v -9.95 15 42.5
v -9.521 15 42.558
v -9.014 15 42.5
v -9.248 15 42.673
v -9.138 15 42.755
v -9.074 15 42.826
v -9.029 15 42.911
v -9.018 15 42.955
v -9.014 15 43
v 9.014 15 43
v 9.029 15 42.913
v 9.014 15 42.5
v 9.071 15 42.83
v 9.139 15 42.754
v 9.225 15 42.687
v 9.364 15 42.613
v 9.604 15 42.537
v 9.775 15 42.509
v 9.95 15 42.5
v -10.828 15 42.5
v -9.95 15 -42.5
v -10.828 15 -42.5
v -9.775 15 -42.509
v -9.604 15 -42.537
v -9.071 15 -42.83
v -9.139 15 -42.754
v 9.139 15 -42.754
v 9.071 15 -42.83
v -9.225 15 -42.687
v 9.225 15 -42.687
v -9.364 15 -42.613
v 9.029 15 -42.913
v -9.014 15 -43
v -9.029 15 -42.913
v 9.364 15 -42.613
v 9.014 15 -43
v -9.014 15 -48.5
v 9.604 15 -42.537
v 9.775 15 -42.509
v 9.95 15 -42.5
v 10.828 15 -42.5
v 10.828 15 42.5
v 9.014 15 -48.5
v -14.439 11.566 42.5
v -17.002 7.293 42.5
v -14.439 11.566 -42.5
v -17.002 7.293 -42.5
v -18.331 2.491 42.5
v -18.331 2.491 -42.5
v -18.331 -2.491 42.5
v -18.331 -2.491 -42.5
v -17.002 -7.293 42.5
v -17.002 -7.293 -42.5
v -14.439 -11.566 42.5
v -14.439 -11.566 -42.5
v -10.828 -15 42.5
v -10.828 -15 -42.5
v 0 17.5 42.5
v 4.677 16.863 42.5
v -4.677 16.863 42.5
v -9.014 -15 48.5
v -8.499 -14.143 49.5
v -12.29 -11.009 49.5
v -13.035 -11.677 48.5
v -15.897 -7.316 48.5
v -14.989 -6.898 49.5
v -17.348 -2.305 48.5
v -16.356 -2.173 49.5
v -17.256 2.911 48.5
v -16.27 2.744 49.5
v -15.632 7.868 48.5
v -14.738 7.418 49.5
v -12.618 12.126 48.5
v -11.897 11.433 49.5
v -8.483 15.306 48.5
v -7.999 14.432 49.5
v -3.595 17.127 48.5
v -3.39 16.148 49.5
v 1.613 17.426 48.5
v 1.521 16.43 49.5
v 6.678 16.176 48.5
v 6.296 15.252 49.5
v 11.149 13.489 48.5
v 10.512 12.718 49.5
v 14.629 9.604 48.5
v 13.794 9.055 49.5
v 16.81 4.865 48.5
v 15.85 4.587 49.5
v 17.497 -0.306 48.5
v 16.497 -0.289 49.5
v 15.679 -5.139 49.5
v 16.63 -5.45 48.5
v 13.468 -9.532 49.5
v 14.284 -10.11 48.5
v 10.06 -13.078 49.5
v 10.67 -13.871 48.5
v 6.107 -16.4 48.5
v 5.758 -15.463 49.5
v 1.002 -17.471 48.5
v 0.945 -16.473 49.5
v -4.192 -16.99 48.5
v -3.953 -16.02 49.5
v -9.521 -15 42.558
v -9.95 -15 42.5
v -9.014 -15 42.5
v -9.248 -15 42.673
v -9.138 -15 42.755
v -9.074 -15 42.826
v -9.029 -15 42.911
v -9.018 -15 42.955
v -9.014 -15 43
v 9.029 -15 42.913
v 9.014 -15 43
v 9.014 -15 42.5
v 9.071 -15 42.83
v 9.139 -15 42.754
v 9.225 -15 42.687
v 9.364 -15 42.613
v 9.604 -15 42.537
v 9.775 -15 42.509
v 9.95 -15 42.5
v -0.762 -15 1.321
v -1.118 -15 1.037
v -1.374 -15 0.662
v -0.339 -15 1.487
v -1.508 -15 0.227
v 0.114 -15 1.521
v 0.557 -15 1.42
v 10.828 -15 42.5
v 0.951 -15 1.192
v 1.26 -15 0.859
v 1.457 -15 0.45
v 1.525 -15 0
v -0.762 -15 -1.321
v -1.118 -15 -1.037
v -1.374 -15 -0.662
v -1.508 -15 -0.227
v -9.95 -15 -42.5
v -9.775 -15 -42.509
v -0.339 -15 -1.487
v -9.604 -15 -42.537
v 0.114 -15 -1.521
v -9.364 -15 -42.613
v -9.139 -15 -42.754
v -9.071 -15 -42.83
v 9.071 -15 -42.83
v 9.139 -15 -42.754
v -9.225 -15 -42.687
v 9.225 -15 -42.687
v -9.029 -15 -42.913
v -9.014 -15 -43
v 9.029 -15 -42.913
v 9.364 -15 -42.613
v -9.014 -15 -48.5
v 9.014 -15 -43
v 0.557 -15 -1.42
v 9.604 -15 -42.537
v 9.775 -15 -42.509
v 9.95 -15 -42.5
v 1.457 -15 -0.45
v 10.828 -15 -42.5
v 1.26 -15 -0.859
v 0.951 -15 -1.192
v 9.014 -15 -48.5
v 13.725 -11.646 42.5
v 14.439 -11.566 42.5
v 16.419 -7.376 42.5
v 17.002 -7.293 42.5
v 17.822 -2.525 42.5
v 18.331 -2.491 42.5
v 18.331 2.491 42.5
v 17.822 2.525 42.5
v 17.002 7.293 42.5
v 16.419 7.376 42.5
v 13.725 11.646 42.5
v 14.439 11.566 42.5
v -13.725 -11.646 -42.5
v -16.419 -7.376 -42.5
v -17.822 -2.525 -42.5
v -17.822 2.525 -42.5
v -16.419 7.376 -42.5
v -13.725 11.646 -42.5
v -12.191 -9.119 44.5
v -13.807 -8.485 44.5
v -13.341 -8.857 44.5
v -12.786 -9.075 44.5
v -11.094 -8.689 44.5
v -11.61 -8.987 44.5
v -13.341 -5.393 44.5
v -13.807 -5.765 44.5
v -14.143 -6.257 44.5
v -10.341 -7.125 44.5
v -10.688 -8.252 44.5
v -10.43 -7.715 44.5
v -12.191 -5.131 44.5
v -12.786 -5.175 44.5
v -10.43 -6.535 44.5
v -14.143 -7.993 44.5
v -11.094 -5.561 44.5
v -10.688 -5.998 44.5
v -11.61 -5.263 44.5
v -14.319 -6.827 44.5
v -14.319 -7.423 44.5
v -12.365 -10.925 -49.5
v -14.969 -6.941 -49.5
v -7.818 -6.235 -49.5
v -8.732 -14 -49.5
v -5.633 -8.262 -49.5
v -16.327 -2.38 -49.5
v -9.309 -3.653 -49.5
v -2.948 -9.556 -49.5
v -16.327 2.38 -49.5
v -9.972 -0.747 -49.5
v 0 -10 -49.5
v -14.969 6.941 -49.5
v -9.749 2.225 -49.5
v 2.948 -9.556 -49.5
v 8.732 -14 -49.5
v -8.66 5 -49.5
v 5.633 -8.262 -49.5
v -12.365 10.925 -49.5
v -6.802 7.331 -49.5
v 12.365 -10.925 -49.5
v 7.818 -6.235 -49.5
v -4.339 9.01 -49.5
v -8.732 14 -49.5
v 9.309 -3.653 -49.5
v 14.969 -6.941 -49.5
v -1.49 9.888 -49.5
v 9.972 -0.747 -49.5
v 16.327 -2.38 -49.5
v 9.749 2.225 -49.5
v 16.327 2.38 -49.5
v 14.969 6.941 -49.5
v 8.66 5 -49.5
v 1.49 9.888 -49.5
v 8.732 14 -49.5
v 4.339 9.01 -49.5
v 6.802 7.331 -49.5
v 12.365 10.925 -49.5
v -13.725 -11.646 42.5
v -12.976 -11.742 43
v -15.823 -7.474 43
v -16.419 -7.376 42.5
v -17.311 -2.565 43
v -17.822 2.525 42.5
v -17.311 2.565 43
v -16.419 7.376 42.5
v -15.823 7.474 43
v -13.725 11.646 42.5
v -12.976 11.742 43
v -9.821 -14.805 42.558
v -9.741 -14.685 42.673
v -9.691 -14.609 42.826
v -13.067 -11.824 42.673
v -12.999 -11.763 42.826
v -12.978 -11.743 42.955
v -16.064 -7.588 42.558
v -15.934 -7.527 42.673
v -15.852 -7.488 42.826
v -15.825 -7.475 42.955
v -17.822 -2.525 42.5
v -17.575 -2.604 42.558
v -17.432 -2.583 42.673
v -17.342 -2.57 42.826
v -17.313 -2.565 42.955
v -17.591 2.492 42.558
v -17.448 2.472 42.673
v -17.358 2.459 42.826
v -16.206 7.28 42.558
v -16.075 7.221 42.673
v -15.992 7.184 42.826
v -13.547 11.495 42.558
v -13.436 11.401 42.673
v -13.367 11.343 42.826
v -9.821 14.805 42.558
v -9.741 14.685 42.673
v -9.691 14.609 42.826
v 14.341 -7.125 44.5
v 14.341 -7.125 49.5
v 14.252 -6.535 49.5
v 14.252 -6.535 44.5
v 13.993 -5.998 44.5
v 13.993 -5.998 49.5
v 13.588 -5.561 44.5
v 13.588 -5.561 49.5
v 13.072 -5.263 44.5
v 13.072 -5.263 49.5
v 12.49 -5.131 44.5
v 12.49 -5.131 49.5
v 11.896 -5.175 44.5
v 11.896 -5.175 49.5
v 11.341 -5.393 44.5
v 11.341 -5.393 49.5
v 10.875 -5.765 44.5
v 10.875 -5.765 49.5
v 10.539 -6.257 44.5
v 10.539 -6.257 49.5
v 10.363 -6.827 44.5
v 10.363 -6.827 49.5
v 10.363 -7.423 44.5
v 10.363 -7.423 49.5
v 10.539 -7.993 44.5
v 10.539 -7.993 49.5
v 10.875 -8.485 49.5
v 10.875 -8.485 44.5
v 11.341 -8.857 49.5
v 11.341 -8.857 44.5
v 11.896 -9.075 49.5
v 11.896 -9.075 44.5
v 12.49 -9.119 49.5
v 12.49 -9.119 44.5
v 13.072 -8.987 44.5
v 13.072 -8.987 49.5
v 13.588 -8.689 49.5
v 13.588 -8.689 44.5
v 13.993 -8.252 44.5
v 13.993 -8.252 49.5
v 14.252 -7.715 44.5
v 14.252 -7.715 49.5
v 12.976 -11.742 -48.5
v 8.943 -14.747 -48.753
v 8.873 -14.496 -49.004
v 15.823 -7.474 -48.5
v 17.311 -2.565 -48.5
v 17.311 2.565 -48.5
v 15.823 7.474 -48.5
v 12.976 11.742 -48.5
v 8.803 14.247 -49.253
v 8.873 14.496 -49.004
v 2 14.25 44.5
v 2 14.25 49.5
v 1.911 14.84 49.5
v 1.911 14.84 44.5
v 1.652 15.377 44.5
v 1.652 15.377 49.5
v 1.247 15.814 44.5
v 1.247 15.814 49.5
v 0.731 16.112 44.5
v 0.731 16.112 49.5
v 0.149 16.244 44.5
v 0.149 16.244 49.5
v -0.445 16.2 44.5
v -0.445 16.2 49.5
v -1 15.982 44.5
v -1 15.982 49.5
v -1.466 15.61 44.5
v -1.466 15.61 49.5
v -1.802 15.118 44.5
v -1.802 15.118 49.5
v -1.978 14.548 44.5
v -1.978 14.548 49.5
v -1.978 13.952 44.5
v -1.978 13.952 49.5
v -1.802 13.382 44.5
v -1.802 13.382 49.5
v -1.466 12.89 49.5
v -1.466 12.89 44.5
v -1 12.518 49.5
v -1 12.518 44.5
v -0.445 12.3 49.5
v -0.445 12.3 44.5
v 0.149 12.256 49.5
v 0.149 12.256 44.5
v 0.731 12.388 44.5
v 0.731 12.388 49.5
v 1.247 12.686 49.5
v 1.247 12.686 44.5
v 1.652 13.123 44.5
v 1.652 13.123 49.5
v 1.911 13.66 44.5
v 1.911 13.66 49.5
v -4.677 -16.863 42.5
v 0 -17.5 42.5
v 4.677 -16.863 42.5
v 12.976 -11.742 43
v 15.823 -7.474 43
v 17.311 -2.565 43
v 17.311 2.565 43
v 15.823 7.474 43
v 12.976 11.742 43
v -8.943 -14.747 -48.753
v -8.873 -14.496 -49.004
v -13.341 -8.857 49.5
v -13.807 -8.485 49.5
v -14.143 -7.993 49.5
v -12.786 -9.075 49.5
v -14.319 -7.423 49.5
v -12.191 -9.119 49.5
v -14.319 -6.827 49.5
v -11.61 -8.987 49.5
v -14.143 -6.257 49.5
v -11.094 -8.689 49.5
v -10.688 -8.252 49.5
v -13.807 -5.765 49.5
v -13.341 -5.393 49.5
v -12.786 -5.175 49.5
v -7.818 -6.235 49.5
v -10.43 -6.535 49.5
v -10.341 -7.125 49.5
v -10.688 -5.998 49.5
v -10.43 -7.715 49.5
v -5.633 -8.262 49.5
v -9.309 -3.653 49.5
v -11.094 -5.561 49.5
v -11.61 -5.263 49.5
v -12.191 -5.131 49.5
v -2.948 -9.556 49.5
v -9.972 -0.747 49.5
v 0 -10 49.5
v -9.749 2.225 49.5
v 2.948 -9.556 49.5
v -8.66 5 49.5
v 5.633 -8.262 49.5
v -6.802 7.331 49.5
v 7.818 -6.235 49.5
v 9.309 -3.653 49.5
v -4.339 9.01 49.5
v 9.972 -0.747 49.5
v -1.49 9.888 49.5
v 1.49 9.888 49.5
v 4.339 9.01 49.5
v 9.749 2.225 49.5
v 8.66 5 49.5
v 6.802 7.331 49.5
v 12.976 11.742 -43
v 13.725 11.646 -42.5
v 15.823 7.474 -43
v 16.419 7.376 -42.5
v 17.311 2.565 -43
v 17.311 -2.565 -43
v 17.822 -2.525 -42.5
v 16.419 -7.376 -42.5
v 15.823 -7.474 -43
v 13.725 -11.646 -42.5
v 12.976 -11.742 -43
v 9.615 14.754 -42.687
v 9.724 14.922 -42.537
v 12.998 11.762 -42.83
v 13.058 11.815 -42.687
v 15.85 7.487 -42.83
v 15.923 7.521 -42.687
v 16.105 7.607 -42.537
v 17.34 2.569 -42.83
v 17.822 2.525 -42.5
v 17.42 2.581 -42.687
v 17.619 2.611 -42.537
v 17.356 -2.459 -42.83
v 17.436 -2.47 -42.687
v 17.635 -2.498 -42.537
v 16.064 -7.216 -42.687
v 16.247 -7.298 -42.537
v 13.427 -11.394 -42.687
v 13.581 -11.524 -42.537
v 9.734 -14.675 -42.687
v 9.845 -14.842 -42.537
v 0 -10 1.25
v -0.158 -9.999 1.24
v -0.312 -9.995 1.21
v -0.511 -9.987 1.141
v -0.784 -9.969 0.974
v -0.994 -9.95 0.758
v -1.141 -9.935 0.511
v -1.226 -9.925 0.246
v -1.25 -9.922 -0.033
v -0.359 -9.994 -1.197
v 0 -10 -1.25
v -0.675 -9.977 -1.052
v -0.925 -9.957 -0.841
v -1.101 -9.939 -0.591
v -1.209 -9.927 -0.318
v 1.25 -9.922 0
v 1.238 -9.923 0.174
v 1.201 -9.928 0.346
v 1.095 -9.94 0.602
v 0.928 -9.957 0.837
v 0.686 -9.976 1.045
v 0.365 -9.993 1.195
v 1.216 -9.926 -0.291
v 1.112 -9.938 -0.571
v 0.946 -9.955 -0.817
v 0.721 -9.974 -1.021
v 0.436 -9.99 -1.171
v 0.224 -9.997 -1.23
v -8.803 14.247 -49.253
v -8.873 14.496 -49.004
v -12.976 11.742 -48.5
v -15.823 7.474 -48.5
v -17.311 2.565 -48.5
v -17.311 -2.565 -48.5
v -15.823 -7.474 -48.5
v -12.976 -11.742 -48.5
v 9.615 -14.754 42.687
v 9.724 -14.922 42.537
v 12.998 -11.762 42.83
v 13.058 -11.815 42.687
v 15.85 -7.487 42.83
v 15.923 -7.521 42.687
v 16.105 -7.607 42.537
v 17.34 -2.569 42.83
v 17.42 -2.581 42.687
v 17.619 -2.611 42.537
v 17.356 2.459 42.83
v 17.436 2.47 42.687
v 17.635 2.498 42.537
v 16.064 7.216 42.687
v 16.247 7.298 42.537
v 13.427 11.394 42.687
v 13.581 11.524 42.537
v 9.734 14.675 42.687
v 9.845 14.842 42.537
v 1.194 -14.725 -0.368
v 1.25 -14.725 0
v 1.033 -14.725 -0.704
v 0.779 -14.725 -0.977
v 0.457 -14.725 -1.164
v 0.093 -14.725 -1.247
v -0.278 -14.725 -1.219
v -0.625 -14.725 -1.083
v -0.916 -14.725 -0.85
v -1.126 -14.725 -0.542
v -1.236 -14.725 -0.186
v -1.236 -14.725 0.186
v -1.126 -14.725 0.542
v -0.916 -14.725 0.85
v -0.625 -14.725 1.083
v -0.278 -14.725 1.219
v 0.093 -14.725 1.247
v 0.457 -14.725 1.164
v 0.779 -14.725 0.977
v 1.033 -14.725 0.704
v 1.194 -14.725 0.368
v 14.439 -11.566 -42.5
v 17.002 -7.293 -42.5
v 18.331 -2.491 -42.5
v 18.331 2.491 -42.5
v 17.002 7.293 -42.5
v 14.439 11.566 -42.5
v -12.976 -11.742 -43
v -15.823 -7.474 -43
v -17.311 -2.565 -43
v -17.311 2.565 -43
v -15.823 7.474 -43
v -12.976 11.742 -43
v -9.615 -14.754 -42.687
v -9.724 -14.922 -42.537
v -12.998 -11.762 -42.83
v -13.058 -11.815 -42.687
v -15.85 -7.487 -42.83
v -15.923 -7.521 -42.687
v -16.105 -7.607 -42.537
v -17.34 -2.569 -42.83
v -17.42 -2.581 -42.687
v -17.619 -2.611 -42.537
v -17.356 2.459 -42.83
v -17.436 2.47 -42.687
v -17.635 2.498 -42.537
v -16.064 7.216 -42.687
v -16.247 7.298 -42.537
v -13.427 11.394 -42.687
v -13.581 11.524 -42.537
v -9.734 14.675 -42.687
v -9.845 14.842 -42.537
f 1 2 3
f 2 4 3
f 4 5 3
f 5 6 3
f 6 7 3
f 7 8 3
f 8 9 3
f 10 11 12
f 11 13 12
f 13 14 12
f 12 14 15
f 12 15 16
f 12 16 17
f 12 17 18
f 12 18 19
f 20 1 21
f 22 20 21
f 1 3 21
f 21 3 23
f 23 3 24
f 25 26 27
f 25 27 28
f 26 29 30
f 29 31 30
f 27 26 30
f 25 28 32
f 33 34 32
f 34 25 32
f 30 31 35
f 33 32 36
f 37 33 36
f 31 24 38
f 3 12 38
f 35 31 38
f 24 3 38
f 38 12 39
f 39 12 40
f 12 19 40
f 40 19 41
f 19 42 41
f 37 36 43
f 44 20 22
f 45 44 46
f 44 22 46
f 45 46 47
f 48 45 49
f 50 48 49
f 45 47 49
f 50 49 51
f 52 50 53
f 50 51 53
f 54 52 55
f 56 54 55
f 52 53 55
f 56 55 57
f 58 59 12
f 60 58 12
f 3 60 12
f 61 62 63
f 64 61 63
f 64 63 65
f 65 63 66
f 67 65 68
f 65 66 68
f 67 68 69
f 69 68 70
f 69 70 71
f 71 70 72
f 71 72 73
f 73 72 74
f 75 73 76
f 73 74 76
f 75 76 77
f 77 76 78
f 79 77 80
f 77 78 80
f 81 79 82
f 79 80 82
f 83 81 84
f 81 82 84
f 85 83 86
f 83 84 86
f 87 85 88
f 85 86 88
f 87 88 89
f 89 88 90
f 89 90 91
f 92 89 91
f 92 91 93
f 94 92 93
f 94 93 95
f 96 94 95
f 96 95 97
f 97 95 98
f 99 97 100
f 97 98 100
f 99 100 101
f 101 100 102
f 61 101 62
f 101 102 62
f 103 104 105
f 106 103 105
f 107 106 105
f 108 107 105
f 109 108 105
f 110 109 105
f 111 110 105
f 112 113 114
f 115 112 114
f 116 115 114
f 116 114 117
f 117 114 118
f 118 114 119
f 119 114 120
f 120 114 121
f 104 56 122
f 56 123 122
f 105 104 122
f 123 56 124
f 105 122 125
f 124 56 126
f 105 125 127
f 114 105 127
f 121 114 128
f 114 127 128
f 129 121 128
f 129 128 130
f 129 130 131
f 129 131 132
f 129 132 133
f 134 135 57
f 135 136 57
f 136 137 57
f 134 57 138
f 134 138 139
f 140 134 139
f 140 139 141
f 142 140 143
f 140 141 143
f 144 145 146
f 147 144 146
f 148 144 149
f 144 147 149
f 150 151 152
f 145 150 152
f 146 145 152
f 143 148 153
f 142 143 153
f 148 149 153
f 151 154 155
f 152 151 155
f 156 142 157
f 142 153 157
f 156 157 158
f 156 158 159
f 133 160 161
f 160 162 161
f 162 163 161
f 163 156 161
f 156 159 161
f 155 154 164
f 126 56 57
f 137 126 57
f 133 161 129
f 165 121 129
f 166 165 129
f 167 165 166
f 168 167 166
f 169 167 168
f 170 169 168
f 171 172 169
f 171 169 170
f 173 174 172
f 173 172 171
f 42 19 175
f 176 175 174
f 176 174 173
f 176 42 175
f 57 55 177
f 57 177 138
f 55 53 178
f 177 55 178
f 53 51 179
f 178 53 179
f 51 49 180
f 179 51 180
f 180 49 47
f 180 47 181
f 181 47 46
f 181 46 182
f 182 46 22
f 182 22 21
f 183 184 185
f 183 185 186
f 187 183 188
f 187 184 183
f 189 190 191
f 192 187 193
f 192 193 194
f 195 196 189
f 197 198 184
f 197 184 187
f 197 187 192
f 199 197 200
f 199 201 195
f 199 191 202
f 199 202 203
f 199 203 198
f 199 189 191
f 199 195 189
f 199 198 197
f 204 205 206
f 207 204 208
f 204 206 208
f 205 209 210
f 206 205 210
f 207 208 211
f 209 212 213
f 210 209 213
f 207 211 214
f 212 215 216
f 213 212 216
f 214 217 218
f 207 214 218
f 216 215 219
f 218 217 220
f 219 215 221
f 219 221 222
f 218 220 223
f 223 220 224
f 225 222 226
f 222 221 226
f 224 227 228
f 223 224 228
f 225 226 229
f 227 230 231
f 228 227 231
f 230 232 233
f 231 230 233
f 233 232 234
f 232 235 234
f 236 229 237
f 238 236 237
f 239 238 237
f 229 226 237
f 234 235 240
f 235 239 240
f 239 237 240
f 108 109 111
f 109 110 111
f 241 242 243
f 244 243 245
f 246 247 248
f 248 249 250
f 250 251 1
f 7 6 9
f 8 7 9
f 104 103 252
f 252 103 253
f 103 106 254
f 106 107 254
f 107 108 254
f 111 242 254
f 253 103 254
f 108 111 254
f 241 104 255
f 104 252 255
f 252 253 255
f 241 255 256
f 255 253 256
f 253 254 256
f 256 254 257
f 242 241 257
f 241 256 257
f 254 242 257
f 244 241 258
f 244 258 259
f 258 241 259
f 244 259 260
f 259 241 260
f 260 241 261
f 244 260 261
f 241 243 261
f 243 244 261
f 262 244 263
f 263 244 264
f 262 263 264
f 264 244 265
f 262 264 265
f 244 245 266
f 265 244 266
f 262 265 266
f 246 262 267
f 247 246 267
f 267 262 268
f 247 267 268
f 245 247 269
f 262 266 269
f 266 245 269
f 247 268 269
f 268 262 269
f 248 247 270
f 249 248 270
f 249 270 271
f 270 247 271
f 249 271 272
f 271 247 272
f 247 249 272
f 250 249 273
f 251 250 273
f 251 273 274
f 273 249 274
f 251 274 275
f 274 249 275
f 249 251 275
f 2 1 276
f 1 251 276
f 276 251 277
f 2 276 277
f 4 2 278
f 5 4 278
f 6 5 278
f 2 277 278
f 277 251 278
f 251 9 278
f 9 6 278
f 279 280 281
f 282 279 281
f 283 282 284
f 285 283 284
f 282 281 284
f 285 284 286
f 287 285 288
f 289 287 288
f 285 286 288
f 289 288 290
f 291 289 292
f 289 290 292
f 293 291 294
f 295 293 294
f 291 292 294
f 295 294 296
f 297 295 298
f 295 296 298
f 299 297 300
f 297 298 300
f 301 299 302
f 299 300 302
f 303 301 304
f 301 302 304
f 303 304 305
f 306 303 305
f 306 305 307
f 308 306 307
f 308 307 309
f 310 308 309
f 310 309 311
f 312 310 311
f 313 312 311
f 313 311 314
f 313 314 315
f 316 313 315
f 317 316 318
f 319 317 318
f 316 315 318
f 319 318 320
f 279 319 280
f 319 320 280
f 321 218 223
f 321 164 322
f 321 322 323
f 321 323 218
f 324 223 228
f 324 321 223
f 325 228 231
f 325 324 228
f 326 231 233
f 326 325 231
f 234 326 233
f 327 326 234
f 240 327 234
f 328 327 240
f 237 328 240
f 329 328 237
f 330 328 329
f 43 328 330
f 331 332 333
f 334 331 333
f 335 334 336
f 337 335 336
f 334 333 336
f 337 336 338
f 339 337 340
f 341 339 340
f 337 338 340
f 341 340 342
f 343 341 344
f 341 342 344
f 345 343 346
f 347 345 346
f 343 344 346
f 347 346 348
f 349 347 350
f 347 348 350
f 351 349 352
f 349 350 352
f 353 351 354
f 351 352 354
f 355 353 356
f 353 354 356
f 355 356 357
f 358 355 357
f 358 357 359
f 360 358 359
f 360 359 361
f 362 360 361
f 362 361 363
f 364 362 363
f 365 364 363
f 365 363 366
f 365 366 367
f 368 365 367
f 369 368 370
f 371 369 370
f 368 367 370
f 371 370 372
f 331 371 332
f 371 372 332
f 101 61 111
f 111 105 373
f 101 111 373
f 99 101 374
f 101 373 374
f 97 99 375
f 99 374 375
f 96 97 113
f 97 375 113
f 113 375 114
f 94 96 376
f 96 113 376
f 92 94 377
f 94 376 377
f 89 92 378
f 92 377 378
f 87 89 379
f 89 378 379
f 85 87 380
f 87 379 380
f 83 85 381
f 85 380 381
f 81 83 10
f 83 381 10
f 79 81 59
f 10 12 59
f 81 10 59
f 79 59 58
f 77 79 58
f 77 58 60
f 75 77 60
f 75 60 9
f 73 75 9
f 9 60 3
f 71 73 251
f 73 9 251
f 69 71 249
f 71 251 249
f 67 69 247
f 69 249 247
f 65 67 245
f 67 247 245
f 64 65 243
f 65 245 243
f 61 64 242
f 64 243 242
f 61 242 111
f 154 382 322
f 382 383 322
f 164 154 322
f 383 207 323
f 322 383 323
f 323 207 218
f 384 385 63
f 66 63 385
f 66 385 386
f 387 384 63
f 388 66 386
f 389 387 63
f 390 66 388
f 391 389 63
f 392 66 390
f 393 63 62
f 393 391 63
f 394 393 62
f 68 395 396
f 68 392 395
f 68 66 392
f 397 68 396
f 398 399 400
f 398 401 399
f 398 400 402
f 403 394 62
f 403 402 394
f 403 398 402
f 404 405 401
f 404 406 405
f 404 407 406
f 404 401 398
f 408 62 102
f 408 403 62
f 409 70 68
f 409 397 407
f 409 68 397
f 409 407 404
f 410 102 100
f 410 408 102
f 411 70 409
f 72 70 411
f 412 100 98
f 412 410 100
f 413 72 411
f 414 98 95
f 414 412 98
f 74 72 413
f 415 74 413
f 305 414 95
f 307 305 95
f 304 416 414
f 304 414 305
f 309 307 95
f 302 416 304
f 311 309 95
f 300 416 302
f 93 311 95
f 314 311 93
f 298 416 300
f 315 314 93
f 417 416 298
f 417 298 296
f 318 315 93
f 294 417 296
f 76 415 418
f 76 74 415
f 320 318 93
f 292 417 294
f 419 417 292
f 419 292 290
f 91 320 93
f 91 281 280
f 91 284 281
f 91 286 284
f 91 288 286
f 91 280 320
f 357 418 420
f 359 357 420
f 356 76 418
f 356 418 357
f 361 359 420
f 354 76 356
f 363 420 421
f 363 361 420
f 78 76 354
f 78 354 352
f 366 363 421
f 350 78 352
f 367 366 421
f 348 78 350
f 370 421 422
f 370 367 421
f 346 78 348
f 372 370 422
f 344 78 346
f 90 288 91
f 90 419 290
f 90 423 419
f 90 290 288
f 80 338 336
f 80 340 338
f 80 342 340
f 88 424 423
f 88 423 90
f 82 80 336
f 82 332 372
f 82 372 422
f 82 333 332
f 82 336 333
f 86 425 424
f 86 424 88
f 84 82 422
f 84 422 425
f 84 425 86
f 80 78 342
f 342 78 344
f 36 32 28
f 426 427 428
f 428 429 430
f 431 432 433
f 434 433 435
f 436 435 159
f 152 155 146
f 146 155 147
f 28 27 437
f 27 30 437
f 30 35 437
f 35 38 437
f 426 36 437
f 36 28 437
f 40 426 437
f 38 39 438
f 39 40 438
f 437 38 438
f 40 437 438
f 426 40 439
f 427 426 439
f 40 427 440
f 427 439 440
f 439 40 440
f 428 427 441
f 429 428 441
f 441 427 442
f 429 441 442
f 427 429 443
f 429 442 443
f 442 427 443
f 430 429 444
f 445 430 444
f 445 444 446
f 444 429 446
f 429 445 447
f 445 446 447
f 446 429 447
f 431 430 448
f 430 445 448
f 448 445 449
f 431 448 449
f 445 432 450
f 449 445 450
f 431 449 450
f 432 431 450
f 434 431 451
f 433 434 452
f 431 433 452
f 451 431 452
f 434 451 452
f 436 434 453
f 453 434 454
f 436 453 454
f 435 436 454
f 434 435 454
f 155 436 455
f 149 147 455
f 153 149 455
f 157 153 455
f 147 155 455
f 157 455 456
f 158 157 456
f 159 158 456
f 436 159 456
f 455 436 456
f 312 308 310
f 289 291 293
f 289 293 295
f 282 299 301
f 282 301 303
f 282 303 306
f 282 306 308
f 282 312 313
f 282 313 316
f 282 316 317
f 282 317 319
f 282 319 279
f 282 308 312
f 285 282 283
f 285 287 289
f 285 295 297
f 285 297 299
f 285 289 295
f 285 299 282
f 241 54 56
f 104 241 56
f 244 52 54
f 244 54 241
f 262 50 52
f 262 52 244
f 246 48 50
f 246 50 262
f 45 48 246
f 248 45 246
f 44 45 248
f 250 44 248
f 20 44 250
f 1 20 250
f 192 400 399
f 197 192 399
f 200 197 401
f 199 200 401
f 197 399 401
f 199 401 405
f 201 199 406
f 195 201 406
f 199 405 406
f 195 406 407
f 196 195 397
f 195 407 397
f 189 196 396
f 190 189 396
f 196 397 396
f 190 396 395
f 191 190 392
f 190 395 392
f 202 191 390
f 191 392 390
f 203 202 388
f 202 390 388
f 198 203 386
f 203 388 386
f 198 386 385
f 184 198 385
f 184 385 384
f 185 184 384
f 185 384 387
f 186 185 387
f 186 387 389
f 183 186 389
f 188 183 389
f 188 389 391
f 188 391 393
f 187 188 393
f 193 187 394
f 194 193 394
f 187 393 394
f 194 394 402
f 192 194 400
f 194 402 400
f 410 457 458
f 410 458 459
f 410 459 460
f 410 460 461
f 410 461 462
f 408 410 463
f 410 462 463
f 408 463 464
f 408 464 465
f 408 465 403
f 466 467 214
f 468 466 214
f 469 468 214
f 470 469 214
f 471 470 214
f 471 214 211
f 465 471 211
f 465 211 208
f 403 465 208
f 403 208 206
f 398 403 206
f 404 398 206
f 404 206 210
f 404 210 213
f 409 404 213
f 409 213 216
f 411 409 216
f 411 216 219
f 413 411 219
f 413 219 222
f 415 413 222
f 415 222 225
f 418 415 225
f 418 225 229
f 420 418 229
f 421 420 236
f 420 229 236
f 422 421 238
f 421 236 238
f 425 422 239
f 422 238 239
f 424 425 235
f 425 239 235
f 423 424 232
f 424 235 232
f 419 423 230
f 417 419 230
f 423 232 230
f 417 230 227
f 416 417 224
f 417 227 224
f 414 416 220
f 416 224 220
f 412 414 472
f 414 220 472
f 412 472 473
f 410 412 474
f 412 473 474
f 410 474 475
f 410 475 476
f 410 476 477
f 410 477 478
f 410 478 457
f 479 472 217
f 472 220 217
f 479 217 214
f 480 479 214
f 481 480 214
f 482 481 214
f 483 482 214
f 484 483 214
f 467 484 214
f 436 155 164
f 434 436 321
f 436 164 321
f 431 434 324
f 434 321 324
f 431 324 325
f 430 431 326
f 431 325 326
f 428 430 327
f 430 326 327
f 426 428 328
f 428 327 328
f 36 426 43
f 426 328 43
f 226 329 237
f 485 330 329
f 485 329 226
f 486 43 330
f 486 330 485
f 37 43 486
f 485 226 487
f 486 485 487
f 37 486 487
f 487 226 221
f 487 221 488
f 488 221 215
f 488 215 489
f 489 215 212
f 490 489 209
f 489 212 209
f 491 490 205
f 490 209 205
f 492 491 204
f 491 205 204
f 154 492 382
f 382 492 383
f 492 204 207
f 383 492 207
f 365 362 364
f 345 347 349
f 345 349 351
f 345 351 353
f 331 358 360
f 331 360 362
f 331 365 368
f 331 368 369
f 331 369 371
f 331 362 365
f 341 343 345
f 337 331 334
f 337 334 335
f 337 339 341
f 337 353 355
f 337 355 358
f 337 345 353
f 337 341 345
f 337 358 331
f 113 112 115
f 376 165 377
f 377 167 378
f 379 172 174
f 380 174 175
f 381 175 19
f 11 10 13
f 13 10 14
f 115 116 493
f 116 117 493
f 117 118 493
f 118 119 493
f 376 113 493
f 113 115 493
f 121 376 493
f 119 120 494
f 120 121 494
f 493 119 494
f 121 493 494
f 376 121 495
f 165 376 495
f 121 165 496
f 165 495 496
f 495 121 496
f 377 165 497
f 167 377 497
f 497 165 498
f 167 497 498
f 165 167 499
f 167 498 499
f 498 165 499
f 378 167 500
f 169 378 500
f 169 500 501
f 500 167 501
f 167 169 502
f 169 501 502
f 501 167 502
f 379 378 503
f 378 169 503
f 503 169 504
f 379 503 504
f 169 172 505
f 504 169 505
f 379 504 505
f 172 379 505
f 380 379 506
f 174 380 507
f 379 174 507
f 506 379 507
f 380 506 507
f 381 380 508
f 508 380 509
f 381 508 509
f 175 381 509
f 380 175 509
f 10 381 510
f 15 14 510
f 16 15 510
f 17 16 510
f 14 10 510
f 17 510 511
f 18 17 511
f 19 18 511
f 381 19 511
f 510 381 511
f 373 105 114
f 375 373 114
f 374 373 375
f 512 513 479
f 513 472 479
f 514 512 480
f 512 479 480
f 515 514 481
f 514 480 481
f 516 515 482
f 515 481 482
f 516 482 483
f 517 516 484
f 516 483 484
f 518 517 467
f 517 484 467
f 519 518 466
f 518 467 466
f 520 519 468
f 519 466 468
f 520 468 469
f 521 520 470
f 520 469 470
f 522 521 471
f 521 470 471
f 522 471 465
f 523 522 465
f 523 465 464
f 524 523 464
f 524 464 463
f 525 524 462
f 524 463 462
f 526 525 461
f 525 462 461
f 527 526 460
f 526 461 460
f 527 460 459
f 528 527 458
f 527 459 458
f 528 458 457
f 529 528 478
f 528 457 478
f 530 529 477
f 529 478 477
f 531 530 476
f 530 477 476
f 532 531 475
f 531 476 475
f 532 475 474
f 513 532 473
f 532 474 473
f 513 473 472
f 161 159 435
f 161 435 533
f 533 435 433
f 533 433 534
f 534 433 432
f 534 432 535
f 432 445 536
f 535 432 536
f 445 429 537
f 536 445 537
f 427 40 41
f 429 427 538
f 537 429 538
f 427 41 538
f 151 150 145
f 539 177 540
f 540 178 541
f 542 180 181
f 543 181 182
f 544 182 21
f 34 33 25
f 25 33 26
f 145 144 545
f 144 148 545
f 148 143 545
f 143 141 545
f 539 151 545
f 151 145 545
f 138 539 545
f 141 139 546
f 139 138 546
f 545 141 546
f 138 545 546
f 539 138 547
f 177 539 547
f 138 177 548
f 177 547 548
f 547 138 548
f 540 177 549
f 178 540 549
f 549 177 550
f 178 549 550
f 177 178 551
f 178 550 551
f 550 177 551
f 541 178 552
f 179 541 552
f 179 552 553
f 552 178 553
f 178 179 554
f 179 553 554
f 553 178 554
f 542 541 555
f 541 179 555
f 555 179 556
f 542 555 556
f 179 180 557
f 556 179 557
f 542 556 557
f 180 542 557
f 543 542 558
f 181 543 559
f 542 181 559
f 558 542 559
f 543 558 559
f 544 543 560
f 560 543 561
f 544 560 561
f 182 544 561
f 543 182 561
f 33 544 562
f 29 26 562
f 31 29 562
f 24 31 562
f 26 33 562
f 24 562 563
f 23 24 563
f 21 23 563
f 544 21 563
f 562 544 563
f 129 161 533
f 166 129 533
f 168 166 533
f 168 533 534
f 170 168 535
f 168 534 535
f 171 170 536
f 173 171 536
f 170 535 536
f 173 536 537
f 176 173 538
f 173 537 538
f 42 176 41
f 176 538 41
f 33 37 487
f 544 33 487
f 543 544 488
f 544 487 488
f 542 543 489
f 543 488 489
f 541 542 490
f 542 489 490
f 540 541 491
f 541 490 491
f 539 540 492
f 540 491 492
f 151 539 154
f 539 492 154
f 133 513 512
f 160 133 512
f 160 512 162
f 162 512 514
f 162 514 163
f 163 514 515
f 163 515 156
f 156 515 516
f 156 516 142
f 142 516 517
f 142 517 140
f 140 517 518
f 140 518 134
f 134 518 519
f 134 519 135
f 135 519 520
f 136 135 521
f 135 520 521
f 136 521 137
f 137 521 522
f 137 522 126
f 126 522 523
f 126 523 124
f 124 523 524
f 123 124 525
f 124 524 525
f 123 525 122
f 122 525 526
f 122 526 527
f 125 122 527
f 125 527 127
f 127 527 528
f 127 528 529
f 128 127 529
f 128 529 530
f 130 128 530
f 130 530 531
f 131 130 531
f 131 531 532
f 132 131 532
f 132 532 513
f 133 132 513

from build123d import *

# Parameters (mm, degrees)
BOSS_EXTRUDE1_DEPTH         = 49.5
BOSS_EXTRUDE1_DEPTH_BACK    = 49.5
BOSS_EXTRUDE2_DEPTH         = 42.5
BOSS_EXTRUDE2_DEPTH_BACK    = 42.5
BOSS_EXTRUDE3_START         = -7
BOSS_EXTRUDE3_DEPTH         = 7
SKETCH6_R                   = 2
SKETCH6_R_2                 = 2.0000000000012577
SKETCH6_R_3                 = 2.0000000000018354
CUT_EXTRUDE1_DEPTH          = 5
M3_TAPPED_HOLE1_D           = 2.5
M3_TAPPED_HOLE1_DEPTH       = 7.5
M3_TAPPED_HOLE1_CSINK_D     = 3.05
M3_TAPPED_HOLE1_CSINK_ANGLE = 90
M3_TAPPED_HOLE1_TIP         = 0.7510757737844503
FILLET1_R                   = 0.5
CHAMFER1_SIZE               = 1
CHAMFER2_SIZE               = 1


with BuildPart() as part:
    # Sketch1 → Boss-Extrude1 (new, two sides: drawn at the far end of the back side and taken through both)
    with BuildSketch(Plane.XY.offset(-BOSS_EXTRUDE1_DEPTH_BACK)):
        with BuildLine():
            Line((9.013878188660517, 15), (0, 15))
            Line((0, 15), (0, 10.000000000000004))
            ThreePointArc((-4.824e-14, 10.000000000000004), (7.07106781186546, 7.071067811865495), (10.000000000000004, 0))
            ThreePointArc((10.000000000000004, -2.45e-15), (7.071067811865457, -7.071067811865499), (-5.513e-14, -10.000000000000004))
            Line((0, -10.000000000000007), (0, -15))
            Line((0, -14.999999999999998), (9.013878188660513, -14.999999999999996))
            ThreePointArc((9.013878188660447, -14.999999999999721), (15.231429156542696, -8.617050878880846), (17.500000000000004, -4.29e-15))
            ThreePointArc((17.500000000000004, 0), (15.231429156542696, 8.617050878880846), (9.013878188660442, 14.999999999999723))
        make_face()
        with BuildLine():
            Line((0, 10.000000000000004), (0, 15))
            Line((0, 15), (-9.013878188659975, 15))
            ThreePointArc((-9.013878188659975, 15.000000000000002), (-17.500000000000004, 1.769e-14), (-9.01387818866, -14.99999999999999))
            Line((-9.013878188659985, -15), (0, -14.999999999999998))
            Line((0, -15), (0, -10.000000000000007))
            ThreePointArc((-5.513e-14, -10.000000000000004), (-10.000000000000004, 1.22e-15), (-4.824e-14, 10.000000000000004))
        make_face()
    extrude(amount=BOSS_EXTRUDE1_DEPTH + BOSS_EXTRUDE1_DEPTH_BACK)

    # Sketch1<23> → Boss-Extrude2 (add, two sides: drawn at the far end of the back side and taken through both)
    with BuildSketch(Plane.XY.offset(-BOSS_EXTRUDE2_DEPTH_BACK)):
        with BuildLine():
            Line((-9.013878188659975, 15), (-10.828203913853855, 15))
            ThreePointArc((-10.828203913853855, 15.000000000000004), (-18.5, -5.95e-15), (-10.828203913853852, -15.000000000000005))
            Line((-10.828203913853855, -15), (-9.013878188659985, -15))
            ThreePointArc((-9.01387818866, -14.99999999999999), (-17.500000000000004, 1.769e-14), (-9.013878188659975, 15.000000000000002))
        make_face()
        with BuildLine():
            ThreePointArc((18.5, 0), (16.470758519362374, 8.424020049646833), (10.828203913853855, 15))
            Line((10.828203913853855, 15), (9.013878188660517, 15))
            ThreePointArc((9.013878188660442, 14.999999999999723), (15.231429156542696, 8.617050878880846), (17.500000000000004, 0))
            ThreePointArc((17.500000000000004, -4.29e-15), (15.231429156542696, -8.617050878880846), (9.013878188660447, -14.999999999999721))
            Line((9.013878188660513, -14.999999999999996), (10.828203913853855, -14.999999999999996))
            ThreePointArc((10.828203913853848, -15.000000000000009), (16.47075851936237, -8.42402004964684), (18.5, -4.53e-15))
        make_face()
    extrude(amount=BOSS_EXTRUDE2_DEPTH + BOSS_EXTRUDE2_DEPTH_BACK)

    # Sketch5 → Boss-Extrude3 (add)
    with BuildSketch(Plane.XY.offset(49.5).offset(BOSS_EXTRUDE3_START)):
        with BuildLine():
            ThreePointArc((9.013878188660444, 14.999999999999721), (2.7267e-13, 17.500000000000004), (-9.013878188659977, 15.000000000000002))
            Line((-9.013878188659975, 15), (9.013878188660518, 14.99999999999984))
        make_face()
        with BuildLine():
            ThreePointArc((-9.013878188659985, -14.999999999999998), (2.6645e-13, -17.500000000000007), (9.01387818866044, -14.999999999999726))
            Line((9.013878188660513, -14.999999999999838), (-9.013878188659987, -14.999999999999998))
        make_face()
    extrude(amount=BOSS_EXTRUDE3_DEPTH)

    # Sketch6 → Cut-Extrude1 (cut)
    with BuildSketch(Plane.XY.offset(49.5)):
        with Locations((0, 14.25)):
            Circle(SKETCH6_R)
        with Locations((12.340862003929768, -7.124999999999125)):
            Circle(SKETCH6_R_2)
        with Locations((-12.340862003926736, -7.12500000000088)):
            Circle(SKETCH6_R_3)
    extrude(amount=-CUT_EXTRUDE1_DEPTH, mode=Mode.SUBTRACT)

    # M3 Tapped Hole1
    with Locations(Plane(origin=(2.4e-15, -14.999999999999998, 0), x_dir=(-1, -1.6e-16, 0), z_dir=(1.6e-16, -1, 0))):
        with Locations((0, 0)):
            CounterSinkHole(M3_TAPPED_HOLE1_D / 2, M3_TAPPED_HOLE1_CSINK_D / 2, depth=M3_TAPPED_HOLE1_DEPTH, counter_sink_angle=M3_TAPPED_HOLE1_CSINK_ANGLE)
            with Locations((0, 0, -(M3_TAPPED_HOLE1_DEPTH + M3_TAPPED_HOLE1_TIP / 2))):  # 118° drill point
                Cone(0, M3_TAPPED_HOLE1_D / 2, M3_TAPPED_HOLE1_TIP, mode=Mode.SUBTRACT)

    # Fillet1
    # the kernel refuses this fillet: 0.5 mm, written as the material it adds along each edge
    with BuildSketch(Plane(origin=(-1.421e-14, 5.77e-15, 42.5), x_dir=(0.45254890557349203, -0.8917395853410538, 0), z_dir=(-0.8917395853410538, -0.45254890557349203, 0))) as fillet1_piece_1_section:
        with BuildLine():
            CenterArc((17.500000000000018 + FILLET1_R, FILLET1_R), FILLET1_R, 180, 90)
            Line((17.500000000000018 + FILLET1_R, 0), (17.500000000000018, 0))
            Line((17.500000000000018, 0), (17.500000000000018, FILLET1_R))
        make_face()
    fillet1_piece_1 = revolve(axis=Axis((-1.421e-14, 5.77e-15, 42.5), (0, 0, 1)), revolution_arc=126.18532587010755, mode=Mode.PRIVATE)
    fillet1_piece_1 = split(fillet1_piece_1, bisect_by=Plane(origin=(17.637648609148254, 15, 42.63764860914824), z_dir=(0, -1, 0)), keep=Keep.TOP, mode=Mode.PRIVATE)
    fillet1_piece_1 = split(fillet1_piece_1, bisect_by=Plane(origin=(17.637648609148258, -14.999999999999995, 42.63764860914824), z_dir=(-2e-16, 1, 0)), keep=Keep.TOP, mode=Mode.PRIVATE)
    add(fillet1_piece_1)
    with BuildSketch(Plane(origin=(-1.066e-14, -6.22e-15, -42.5), x_dir=(0.4525489055734917, 0.891739585341054, 0), z_dir=(-0.891739585341054, 0.4525489055734917, 0))) as fillet1_piece_2_section:
        with BuildLine():
            CenterArc((17.50000000000003 + FILLET1_R, FILLET1_R), FILLET1_R, 180, 90)
            Line((17.50000000000003 + FILLET1_R, 0), (17.50000000000003, 0))
            Line((17.50000000000003, 0), (17.50000000000003, FILLET1_R))
        make_face()
    fillet1_piece_2 = revolve(axis=Axis((-1.066e-14, -6.22e-15, -42.5), (0, 0, -1)), revolution_arc=126.18532587010758, mode=Mode.PRIVATE)
    fillet1_piece_2 = split(fillet1_piece_2, bisect_by=Plane(origin=(17.63764860914827, 15, -42.63764860914825), z_dir=(0, -1, 0)), keep=Keep.TOP, mode=Mode.PRIVATE)
    fillet1_piece_2 = split(fillet1_piece_2, bisect_by=Plane(origin=(17.637648609148272, -14.999999999999995, -42.63764860914825), z_dir=(-2e-16, 1, 0)), keep=Keep.TOP, mode=Mode.PRIVATE)
    add(fillet1_piece_2)
    with BuildSketch(Plane(origin=(1.78e-15, -1.33e-15, 42.5), x_dir=(-0.4525489055734672, -0.8917395853410666, 0), z_dir=(0.8917395853410666, -0.4525489055734672, 0))) as fillet1_piece_3_section:
        with BuildLine():
            CenterArc((17.50000000000002 + FILLET1_R, -FILLET1_R), FILLET1_R, 90, 90)
            Line((17.50000000000002 + FILLET1_R, 0), (17.50000000000002, 0))
            Line((17.50000000000002, 0), (17.50000000000002, -FILLET1_R))
        make_face()
    fillet1_piece_3 = revolve(axis=Axis((1.78e-15, -1.33e-15, 42.5), (0, 0, -1)), revolution_arc=126.18532587011086, mode=Mode.PRIVATE)
    fillet1_piece_3 = split(fillet1_piece_3, bisect_by=Plane(origin=(-17.637648609148275, 15, 42.63764860914824), z_dir=(0, -1, 0)), keep=Keep.TOP, mode=Mode.PRIVATE)
    fillet1_piece_3 = split(fillet1_piece_3, bisect_by=Plane(origin=(-17.637648609148272, -15.000000000000002, 42.63764860914824), z_dir=(-2e-16, 1, 0)), keep=Keep.TOP, mode=Mode.PRIVATE)
    add(fillet1_piece_3)
    with BuildSketch(Plane(origin=(1.78e-15, -1.33e-15, -42.5), x_dir=(-0.4525489055734672, -0.8917395853410666, 0), z_dir=(0.8917395853410666, -0.4525489055734672, 0))) as fillet1_piece_4_section:
        with BuildLine():
            CenterArc((17.500000000000007 + FILLET1_R, FILLET1_R), FILLET1_R, 180, 90)
            Line((17.50000000000001, FILLET1_R), (17.500000000000007, 0))
            Line((17.500000000000007, 0), (17.500000000000007 + FILLET1_R, 0))
        make_face()
    fillet1_piece_4 = revolve(axis=Axis((1.78e-15, -1.33e-15, -42.5), (0, 0, -1)), revolution_arc=126.18532587011086, mode=Mode.PRIVATE)
    fillet1_piece_4 = split(fillet1_piece_4, bisect_by=Plane(origin=(-17.637648609147508, 15, -42.6376486091475), z_dir=(0, -1, 0)), keep=Keep.TOP, mode=Mode.PRIVATE)
    fillet1_piece_4 = split(fillet1_piece_4, bisect_by=Plane(origin=(-17.637648609147504, -15.000000000000002, -42.6376486091475), z_dir=(-2e-16, 1, 0)), keep=Keep.TOP, mode=Mode.PRIVATE)
    add(fillet1_piece_4)

    # Chamfer1
    chamfer1_edges = [part.edges().sort_by_distance(p)[0] for p in [
        (9.01387818866, 14.99999999999999, 49.5),
        (-17.500000000000007, 1.066e-14, -49.5),
        (17.500000000000004, 5.77e-15, -49.5),
    ]]
    chamfer(chamfer1_edges, length=CHAMFER1_SIZE)

    # Chamfer2
    chamfer2_edges = [part.edges().sort_by_distance(p)[0] for p in [
        (1.78e-15, -14.999999999999927, -49.5),
        (1.421e-14, 14.999999999999932, -49.5),
    ]]
    chamfer(chamfer2_edges, length=CHAMFER2_SIZE)


solid = part.part
